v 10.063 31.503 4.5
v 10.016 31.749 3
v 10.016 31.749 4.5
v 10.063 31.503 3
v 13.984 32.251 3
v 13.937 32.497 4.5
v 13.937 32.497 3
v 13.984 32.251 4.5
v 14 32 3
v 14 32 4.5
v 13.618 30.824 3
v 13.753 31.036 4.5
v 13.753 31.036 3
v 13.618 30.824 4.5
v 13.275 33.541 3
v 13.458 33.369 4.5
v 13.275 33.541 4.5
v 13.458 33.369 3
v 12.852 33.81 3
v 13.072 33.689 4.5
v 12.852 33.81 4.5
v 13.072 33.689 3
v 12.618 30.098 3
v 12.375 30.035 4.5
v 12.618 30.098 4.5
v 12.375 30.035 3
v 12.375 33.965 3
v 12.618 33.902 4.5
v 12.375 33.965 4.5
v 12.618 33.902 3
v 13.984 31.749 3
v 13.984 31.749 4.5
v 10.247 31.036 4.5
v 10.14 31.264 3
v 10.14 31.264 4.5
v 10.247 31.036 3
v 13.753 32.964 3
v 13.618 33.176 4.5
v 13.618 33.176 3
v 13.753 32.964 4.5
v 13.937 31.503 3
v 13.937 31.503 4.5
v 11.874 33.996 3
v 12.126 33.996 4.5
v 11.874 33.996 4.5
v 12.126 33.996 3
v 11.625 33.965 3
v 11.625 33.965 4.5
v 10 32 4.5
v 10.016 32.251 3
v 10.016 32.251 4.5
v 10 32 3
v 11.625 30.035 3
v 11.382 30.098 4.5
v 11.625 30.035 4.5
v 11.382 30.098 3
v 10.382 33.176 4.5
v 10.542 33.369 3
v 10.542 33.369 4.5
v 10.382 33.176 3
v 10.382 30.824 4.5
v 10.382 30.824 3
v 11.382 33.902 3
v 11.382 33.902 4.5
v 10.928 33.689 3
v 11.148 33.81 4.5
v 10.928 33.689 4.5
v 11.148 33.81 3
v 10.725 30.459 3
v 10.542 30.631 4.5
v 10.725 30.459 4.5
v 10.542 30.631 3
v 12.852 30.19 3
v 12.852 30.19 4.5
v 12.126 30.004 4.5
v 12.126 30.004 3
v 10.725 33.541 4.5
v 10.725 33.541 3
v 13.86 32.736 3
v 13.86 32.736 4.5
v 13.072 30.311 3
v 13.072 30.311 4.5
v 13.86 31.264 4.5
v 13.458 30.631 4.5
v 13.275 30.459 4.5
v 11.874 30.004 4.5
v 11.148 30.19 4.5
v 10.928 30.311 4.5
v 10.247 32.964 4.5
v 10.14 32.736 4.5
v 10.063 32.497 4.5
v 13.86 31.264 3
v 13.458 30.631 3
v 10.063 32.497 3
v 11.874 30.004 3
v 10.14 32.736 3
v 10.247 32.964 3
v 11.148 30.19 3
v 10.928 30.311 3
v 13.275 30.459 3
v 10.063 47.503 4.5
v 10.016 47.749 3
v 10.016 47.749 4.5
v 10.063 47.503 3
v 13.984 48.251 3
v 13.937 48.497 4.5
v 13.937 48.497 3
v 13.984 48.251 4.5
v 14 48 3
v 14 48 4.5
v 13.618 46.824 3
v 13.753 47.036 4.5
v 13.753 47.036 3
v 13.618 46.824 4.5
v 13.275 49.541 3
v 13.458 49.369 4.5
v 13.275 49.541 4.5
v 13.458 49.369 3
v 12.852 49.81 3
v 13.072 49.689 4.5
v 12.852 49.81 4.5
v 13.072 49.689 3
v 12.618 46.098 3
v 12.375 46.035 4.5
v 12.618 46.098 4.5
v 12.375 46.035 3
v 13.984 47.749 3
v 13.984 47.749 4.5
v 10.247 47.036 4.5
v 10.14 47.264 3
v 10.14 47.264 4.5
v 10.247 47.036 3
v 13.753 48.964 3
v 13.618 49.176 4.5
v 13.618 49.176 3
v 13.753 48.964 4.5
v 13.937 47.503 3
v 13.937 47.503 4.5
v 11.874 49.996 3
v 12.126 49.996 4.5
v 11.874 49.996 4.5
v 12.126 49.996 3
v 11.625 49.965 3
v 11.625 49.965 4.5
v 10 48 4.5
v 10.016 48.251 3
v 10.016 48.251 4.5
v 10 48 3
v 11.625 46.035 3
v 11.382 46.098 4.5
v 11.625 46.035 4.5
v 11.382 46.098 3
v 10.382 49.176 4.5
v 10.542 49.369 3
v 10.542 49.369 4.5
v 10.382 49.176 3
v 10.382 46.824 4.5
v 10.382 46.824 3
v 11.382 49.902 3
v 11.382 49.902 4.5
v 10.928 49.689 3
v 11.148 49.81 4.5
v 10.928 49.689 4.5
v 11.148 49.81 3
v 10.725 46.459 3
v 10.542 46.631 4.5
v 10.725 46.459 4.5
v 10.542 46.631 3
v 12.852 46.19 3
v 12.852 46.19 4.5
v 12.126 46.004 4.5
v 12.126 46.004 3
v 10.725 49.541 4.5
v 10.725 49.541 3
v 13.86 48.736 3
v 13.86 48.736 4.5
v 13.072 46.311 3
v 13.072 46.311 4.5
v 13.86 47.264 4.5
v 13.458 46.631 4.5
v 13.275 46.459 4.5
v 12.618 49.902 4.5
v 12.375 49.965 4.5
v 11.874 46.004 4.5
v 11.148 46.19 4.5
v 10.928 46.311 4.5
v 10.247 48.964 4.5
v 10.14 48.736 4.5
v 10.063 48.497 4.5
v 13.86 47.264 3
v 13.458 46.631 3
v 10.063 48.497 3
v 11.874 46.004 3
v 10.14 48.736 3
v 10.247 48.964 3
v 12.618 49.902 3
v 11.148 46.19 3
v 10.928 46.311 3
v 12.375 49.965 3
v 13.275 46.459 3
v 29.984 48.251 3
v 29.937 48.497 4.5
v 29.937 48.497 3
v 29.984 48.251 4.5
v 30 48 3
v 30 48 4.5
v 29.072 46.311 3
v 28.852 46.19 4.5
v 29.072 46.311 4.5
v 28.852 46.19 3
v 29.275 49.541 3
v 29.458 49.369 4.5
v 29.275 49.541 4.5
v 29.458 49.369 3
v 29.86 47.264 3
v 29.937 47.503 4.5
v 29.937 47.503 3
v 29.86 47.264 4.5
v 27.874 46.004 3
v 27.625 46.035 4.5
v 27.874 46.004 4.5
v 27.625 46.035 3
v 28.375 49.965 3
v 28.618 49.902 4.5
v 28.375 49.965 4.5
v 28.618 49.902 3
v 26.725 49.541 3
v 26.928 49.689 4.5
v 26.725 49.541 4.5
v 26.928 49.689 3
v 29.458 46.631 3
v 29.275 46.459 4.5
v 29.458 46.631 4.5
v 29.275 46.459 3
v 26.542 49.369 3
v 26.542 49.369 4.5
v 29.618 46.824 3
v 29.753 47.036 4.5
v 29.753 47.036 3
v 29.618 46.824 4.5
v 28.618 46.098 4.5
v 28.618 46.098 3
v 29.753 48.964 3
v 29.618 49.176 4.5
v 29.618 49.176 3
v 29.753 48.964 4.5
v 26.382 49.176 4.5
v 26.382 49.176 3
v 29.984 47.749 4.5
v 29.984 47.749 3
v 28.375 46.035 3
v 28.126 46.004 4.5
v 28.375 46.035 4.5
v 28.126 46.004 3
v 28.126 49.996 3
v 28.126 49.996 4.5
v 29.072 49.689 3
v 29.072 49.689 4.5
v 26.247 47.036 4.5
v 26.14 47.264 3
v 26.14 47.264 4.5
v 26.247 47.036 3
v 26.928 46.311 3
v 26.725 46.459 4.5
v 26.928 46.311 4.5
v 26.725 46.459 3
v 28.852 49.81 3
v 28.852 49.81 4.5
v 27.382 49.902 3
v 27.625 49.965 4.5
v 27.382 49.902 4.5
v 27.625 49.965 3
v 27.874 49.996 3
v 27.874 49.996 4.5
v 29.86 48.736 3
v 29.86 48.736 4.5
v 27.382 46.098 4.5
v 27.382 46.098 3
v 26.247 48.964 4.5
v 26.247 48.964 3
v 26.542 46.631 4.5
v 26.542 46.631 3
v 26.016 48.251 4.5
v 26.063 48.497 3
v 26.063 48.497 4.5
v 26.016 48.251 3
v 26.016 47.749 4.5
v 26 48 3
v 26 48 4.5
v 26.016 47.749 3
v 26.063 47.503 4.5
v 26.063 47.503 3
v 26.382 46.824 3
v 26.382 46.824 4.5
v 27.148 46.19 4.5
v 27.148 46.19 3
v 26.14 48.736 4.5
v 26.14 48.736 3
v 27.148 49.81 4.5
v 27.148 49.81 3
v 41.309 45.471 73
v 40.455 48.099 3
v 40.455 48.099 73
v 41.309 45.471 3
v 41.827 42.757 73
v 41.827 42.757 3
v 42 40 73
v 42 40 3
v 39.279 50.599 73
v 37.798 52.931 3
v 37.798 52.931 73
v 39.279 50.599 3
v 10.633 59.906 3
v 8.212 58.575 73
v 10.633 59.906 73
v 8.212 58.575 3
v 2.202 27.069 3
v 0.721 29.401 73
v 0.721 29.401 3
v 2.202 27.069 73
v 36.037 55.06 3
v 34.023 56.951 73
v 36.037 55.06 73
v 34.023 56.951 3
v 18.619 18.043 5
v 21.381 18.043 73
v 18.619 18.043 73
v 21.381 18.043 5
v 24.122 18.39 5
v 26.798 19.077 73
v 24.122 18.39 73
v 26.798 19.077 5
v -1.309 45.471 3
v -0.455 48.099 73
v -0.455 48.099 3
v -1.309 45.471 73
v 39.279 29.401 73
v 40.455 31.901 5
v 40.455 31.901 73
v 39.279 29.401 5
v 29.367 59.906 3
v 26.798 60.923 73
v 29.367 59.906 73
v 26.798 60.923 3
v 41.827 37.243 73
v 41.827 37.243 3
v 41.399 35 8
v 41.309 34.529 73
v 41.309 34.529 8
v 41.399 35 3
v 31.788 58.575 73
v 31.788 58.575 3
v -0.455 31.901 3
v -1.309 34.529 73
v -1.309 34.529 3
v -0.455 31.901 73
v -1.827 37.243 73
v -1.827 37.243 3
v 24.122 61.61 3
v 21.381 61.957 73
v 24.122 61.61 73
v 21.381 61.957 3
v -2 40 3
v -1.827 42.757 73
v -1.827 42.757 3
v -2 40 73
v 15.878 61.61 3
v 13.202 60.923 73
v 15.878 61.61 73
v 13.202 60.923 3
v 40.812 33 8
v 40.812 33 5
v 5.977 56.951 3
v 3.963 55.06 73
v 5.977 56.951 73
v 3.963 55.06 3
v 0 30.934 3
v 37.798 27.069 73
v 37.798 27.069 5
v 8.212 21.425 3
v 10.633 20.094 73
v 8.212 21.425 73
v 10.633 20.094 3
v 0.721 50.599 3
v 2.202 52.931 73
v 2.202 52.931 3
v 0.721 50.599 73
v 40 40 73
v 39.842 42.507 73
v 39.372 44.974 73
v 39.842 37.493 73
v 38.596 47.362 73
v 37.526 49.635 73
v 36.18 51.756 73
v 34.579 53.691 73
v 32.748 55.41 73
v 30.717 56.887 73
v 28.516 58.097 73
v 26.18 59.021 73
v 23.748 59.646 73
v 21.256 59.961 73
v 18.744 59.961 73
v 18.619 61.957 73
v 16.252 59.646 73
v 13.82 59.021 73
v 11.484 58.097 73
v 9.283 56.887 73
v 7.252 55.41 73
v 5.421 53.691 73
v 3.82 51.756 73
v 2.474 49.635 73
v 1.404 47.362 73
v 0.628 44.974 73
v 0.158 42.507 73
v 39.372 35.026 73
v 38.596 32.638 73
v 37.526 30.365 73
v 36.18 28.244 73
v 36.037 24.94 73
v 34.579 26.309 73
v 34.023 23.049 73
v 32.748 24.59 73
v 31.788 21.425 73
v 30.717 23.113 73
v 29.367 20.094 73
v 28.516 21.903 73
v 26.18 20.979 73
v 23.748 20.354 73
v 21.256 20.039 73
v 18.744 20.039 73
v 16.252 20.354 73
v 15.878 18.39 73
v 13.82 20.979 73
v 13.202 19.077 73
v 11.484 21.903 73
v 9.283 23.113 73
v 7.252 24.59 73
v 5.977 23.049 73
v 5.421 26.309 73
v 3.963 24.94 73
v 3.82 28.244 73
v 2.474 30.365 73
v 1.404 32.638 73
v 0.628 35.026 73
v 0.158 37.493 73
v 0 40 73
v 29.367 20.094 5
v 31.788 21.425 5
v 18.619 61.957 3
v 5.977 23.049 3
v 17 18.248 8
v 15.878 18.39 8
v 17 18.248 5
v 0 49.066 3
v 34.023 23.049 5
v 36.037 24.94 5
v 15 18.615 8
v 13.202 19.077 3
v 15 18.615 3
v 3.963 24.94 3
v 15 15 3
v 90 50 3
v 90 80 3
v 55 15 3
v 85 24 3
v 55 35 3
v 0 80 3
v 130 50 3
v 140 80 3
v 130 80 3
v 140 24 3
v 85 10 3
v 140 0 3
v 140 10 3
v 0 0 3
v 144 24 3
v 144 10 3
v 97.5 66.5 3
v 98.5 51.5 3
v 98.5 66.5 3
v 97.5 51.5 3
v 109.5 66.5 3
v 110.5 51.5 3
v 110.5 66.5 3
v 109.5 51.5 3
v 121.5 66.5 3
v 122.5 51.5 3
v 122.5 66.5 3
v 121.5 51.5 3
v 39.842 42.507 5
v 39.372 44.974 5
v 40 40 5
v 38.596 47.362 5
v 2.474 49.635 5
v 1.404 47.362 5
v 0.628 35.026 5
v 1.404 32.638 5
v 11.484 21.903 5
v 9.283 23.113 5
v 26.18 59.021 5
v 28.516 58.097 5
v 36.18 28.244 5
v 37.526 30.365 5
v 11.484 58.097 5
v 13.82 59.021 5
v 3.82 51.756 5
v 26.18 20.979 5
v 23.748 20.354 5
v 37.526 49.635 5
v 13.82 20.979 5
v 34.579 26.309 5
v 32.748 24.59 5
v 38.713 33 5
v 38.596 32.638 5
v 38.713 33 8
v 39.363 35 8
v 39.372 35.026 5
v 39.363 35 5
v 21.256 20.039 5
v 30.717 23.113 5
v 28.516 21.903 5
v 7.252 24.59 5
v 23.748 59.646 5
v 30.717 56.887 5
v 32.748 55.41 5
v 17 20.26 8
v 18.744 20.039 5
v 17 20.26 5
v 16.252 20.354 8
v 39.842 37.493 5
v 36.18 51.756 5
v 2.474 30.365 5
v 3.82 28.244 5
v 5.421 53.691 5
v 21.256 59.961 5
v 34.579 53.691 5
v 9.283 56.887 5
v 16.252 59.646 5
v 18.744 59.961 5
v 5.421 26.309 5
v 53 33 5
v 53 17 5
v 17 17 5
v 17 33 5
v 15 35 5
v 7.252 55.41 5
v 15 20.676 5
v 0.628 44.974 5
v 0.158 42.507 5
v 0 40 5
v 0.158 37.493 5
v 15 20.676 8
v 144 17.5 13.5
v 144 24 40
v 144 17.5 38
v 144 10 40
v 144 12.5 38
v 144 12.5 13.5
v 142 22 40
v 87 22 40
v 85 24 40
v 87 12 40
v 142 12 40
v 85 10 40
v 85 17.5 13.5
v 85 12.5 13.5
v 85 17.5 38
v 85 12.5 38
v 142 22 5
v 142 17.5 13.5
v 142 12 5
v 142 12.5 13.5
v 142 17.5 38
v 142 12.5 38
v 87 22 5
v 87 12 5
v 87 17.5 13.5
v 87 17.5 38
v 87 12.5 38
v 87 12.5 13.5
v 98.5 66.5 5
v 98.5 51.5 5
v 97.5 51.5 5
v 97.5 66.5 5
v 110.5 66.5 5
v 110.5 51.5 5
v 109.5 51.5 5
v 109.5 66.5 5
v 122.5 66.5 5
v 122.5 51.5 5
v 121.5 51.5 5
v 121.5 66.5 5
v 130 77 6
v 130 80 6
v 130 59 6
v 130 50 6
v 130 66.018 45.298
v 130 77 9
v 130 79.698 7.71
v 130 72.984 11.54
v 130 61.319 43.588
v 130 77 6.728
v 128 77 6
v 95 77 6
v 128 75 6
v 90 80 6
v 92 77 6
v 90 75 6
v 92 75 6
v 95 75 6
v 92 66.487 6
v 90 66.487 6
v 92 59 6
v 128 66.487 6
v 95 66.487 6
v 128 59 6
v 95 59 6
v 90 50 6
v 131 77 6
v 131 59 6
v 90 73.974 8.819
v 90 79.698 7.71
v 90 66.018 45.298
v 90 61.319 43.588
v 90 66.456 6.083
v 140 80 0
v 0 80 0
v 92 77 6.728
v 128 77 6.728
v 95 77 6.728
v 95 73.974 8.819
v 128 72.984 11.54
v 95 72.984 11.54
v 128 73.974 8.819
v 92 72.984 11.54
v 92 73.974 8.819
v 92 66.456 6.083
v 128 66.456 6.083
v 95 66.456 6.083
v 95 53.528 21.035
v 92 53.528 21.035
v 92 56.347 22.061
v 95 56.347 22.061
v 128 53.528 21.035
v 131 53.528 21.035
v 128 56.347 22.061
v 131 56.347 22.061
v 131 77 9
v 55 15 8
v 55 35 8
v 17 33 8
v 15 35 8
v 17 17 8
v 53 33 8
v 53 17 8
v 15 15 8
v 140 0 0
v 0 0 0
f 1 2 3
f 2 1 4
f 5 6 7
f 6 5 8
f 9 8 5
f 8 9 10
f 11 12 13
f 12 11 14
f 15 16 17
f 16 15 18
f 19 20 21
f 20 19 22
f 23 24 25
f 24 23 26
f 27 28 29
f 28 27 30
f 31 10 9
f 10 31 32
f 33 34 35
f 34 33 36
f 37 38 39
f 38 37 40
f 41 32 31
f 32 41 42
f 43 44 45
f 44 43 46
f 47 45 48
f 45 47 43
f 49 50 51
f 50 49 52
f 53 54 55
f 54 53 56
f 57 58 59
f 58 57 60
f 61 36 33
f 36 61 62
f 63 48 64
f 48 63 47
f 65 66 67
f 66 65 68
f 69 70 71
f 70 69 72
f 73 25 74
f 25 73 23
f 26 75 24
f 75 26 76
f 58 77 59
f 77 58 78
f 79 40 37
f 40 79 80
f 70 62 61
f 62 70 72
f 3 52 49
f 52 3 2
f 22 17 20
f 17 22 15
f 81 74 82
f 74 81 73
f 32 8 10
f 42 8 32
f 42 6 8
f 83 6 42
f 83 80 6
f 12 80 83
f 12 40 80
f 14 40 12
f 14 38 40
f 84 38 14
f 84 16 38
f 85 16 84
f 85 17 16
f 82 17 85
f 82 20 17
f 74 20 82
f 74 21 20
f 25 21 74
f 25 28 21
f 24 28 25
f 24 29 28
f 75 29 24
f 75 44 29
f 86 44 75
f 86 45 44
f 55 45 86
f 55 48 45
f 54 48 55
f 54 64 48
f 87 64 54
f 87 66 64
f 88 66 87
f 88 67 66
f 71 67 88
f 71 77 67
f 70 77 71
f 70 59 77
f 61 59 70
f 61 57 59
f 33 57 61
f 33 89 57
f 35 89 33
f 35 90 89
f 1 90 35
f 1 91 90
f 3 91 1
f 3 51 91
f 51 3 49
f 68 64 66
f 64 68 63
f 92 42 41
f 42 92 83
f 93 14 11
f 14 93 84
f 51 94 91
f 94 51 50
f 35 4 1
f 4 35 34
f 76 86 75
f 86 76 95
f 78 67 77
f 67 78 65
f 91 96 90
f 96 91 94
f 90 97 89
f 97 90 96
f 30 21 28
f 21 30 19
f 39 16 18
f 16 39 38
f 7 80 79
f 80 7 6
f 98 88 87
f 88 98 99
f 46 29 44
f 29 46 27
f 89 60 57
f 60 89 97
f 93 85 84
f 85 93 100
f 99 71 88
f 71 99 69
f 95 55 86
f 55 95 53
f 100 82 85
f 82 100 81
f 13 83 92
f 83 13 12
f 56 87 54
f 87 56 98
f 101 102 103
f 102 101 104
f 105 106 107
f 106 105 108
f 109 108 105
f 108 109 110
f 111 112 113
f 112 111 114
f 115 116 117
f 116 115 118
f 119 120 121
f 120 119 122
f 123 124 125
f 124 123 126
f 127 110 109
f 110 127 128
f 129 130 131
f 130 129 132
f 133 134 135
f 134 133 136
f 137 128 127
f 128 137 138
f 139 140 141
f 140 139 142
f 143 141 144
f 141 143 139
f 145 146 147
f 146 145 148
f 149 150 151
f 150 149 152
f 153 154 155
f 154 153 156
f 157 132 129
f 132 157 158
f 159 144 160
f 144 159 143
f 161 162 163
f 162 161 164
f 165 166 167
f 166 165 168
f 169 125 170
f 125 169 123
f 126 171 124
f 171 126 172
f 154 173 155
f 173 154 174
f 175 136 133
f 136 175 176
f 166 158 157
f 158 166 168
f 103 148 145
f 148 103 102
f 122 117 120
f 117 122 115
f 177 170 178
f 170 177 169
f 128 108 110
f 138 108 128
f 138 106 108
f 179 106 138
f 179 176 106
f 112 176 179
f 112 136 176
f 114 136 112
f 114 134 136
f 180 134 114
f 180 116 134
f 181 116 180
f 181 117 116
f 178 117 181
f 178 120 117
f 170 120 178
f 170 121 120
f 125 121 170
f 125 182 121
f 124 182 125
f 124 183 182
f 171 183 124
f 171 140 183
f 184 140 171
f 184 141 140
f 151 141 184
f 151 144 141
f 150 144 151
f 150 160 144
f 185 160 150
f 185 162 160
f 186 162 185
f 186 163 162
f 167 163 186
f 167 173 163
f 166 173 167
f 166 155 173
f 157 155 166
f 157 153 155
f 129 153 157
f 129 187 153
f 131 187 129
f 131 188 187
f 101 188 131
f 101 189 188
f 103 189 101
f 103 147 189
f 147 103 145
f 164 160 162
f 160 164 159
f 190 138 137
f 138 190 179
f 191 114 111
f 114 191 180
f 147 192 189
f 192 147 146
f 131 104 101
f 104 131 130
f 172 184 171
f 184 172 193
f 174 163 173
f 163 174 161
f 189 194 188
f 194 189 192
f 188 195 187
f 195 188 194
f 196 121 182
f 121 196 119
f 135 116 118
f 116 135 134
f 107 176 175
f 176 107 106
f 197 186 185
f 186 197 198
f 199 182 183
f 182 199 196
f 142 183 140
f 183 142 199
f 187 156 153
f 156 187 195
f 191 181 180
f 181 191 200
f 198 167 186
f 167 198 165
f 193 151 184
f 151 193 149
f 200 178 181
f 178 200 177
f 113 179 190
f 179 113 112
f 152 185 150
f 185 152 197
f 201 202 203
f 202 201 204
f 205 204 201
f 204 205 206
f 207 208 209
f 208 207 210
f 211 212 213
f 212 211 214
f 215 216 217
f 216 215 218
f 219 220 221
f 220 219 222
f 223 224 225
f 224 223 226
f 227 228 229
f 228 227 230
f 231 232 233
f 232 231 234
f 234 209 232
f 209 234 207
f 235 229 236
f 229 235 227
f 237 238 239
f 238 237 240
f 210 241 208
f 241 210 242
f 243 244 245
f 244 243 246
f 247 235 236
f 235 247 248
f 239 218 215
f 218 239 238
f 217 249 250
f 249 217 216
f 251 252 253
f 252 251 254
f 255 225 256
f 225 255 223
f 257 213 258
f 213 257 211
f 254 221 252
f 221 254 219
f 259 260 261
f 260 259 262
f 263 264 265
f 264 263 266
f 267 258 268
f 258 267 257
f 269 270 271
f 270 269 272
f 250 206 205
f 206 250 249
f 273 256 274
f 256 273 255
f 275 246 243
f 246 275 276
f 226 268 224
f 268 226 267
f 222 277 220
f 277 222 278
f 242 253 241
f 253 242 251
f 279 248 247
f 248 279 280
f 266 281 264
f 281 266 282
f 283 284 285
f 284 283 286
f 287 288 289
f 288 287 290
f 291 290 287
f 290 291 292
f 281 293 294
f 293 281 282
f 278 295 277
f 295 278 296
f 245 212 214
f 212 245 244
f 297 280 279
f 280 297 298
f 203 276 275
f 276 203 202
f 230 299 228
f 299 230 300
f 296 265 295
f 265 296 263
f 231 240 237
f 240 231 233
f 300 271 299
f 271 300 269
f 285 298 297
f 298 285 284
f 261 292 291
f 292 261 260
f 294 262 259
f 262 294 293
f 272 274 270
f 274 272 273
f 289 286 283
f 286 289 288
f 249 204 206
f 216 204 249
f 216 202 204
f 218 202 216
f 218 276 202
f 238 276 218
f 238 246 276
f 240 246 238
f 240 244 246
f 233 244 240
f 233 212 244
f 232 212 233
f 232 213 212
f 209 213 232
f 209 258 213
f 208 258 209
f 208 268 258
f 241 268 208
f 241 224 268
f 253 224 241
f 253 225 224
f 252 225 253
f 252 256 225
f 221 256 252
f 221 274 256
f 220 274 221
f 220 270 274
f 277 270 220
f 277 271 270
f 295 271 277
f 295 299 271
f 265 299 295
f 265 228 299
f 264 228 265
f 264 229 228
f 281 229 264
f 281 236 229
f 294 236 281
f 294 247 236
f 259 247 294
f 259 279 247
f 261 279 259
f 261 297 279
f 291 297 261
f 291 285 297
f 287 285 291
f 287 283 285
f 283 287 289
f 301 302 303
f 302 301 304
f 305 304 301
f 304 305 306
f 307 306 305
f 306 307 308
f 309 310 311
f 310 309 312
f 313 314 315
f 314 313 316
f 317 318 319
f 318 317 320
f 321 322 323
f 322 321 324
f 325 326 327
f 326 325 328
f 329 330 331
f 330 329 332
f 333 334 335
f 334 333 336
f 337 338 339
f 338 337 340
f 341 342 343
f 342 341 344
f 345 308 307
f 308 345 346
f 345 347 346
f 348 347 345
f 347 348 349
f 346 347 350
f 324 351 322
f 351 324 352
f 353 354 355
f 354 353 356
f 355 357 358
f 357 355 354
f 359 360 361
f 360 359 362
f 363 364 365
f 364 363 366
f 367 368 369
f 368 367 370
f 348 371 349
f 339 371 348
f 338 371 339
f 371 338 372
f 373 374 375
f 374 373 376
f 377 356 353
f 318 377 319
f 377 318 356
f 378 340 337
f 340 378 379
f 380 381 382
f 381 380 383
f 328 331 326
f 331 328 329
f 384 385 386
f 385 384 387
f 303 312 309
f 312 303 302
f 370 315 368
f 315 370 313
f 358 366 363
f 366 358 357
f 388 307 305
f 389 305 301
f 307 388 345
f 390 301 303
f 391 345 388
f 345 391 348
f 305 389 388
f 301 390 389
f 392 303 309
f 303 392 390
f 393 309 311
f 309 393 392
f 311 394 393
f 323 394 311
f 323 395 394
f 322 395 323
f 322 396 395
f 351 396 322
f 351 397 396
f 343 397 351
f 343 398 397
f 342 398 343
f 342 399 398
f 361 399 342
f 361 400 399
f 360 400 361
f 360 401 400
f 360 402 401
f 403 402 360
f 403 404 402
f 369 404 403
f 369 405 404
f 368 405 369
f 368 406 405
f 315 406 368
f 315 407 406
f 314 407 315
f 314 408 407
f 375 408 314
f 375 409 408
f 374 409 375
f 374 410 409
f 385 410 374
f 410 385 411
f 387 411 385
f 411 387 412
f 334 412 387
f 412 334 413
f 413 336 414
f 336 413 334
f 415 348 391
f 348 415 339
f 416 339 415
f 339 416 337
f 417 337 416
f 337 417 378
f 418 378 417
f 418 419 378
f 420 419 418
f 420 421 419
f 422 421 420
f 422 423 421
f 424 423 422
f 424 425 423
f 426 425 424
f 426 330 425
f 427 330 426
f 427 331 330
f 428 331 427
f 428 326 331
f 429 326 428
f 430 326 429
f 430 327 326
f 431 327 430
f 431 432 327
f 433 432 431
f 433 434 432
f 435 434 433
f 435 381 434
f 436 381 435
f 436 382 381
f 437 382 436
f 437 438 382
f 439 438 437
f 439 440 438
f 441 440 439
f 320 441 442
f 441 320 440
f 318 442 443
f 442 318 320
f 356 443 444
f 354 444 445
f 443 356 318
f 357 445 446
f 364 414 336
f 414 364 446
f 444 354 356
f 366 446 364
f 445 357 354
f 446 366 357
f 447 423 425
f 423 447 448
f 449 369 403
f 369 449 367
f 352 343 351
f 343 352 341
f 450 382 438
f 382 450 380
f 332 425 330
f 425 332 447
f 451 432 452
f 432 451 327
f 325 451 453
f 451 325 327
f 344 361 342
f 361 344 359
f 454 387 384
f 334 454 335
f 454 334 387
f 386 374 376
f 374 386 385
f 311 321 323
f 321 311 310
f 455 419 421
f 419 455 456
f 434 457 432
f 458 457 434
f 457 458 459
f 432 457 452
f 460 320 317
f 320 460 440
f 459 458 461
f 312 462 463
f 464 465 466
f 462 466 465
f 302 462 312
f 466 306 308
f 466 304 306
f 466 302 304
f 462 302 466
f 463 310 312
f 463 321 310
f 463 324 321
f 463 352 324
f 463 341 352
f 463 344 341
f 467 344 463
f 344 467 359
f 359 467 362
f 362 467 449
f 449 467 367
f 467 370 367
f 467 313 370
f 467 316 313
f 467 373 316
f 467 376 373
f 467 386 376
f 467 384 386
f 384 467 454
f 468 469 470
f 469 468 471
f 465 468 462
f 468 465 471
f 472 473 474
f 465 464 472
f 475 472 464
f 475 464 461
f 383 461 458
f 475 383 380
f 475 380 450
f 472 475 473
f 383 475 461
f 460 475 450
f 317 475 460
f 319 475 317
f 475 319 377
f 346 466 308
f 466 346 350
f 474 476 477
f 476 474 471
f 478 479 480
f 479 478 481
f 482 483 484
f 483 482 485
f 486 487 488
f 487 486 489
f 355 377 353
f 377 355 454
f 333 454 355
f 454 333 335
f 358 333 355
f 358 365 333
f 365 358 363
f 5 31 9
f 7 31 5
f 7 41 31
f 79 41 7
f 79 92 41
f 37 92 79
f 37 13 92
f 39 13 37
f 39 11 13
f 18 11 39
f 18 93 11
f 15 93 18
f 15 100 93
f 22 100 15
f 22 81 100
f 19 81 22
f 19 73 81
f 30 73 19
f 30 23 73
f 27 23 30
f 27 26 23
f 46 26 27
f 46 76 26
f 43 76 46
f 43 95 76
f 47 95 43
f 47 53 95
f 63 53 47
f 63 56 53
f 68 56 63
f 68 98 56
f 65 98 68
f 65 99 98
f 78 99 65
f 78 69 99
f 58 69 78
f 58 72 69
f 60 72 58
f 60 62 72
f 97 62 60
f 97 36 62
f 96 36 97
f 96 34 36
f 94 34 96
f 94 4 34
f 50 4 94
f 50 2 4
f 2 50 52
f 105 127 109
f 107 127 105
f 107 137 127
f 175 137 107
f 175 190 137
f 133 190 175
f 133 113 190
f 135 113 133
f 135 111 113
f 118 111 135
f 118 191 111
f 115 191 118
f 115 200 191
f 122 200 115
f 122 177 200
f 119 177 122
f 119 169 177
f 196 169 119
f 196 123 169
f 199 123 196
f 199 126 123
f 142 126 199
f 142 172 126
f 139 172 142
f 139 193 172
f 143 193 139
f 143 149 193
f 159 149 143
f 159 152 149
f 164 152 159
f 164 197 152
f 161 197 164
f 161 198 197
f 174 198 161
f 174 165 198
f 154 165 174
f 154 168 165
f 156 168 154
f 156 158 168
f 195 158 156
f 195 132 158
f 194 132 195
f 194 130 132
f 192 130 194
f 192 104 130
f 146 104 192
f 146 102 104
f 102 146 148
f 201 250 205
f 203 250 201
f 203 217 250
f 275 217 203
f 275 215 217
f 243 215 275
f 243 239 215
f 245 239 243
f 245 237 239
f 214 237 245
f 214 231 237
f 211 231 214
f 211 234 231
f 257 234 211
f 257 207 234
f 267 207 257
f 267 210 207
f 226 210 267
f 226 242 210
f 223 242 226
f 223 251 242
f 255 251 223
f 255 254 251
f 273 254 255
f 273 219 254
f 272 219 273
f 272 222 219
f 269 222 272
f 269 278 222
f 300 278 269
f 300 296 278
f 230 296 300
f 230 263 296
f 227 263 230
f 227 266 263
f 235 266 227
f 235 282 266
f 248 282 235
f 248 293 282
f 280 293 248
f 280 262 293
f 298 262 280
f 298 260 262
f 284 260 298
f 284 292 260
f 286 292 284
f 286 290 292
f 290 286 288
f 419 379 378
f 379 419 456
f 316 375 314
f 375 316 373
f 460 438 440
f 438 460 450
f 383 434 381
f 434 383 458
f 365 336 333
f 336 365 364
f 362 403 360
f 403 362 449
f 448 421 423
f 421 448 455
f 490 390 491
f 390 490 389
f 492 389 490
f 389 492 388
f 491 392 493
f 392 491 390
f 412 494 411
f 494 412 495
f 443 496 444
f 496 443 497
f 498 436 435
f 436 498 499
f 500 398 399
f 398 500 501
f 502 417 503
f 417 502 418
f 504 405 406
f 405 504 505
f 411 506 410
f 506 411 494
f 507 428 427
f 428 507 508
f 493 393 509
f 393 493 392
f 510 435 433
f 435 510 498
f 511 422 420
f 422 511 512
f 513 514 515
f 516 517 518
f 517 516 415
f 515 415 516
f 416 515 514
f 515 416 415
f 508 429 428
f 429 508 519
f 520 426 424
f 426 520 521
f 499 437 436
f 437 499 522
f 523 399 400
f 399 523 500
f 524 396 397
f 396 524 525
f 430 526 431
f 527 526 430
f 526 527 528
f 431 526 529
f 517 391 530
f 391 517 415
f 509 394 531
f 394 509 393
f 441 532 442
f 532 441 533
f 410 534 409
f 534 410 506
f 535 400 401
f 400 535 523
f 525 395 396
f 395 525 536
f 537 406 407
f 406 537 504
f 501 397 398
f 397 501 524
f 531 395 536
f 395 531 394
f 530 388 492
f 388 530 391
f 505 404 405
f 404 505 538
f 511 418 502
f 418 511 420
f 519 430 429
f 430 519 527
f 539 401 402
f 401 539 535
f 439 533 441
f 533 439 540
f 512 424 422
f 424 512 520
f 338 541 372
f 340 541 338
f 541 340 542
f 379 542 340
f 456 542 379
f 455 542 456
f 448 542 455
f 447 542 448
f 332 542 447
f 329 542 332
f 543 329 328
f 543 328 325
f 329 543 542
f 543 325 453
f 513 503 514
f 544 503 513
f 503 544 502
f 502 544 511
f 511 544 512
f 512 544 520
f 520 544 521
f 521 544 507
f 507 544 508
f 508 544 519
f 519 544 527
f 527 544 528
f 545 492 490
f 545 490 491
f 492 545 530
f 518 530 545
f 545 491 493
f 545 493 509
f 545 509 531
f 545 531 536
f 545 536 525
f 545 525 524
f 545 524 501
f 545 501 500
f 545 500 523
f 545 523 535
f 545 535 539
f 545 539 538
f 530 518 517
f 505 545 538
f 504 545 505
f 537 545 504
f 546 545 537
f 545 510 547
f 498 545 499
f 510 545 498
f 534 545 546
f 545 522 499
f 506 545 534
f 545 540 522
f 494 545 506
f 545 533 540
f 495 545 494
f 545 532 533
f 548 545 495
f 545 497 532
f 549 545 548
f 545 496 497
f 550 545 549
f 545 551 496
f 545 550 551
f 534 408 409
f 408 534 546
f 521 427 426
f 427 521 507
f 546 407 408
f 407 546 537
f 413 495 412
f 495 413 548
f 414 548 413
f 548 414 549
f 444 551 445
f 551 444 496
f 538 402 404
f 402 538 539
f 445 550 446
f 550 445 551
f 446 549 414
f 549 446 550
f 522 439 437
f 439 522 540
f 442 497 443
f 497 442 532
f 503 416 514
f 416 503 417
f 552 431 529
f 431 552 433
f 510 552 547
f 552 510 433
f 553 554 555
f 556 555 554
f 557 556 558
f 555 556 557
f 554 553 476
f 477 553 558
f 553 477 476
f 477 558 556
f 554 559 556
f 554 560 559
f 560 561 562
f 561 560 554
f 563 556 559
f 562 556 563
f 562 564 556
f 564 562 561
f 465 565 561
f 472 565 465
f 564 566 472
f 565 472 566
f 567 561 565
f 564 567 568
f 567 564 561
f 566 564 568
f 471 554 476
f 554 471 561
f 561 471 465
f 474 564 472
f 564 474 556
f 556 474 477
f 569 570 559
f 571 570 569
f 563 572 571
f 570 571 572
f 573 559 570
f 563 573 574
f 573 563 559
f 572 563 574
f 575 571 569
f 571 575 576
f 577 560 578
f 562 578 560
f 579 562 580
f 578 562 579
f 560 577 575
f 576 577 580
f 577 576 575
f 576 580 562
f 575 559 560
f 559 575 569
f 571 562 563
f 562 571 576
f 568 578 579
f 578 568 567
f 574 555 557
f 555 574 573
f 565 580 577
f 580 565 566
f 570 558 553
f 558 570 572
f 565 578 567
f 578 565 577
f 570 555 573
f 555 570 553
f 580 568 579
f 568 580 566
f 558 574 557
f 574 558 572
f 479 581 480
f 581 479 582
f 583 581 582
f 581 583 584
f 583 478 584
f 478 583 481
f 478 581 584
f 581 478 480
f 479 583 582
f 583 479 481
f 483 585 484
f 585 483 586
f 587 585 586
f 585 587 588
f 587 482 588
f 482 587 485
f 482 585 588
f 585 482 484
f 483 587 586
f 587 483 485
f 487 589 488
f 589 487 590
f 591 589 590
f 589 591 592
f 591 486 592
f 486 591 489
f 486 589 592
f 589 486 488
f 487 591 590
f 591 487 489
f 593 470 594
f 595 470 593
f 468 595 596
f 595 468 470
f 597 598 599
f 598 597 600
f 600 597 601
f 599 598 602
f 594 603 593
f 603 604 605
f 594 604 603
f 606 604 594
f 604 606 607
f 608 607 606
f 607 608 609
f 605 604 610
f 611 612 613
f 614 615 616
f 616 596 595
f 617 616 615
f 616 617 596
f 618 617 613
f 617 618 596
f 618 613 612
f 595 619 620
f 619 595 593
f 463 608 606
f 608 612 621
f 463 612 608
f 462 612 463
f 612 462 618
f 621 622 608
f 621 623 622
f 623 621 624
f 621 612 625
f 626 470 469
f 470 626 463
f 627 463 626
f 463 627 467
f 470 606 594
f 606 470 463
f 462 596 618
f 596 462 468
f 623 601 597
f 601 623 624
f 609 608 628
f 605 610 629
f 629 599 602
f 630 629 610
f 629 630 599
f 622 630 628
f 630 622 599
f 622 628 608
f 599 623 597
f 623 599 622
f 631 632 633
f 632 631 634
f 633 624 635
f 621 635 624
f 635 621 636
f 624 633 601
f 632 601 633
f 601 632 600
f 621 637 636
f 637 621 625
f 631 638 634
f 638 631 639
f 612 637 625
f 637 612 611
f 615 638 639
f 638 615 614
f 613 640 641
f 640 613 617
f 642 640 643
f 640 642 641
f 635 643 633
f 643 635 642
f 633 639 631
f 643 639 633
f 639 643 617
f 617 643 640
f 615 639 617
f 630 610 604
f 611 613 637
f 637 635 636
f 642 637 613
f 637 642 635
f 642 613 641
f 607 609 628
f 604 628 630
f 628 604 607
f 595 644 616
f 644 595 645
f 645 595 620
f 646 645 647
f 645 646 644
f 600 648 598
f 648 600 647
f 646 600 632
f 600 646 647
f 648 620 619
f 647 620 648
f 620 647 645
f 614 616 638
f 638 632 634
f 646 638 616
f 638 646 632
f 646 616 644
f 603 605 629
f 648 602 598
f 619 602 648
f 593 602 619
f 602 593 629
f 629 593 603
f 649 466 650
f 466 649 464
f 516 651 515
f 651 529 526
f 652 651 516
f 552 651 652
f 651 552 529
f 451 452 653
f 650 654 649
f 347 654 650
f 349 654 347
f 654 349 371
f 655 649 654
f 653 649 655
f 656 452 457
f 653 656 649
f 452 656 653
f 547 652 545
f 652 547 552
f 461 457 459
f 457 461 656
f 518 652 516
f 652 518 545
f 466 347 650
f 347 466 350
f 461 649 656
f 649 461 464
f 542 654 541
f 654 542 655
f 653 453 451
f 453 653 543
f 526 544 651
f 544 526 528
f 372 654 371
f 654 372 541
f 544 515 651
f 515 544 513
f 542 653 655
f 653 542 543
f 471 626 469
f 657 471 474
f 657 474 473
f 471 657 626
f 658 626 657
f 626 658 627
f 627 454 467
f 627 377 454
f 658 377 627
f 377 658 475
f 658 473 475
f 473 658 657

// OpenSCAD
// examples/desktop_organizer.scad
// ==============================================
// 桌面收纳 — 笔筒 + 名片夹 + 手机支架一体
// 适合 3D 打印的实用桌面配件

$fn = 50;

// ---- 笔筒部分 ----
module pen_holder(
    diameter = 50,
    height   = 80,
    wall     = 2,
    bottom   = 2
) {
    difference() {
        cylinder(r = diameter / 2 + wall, h = height);

        // 内部
        translate([0, 0, bottom])
            cylinder(r = diameter / 2, h = height);

        // 底部排水/透气孔
        for (x = [-1, 1]) {
            for (y = [-1, 1]) {
                translate([x * diameter * 0.2,
                           y * diameter * 0.2, 0])
                    cylinder(r = 2, h = bottom + 1, center = true);
            }
        }
    }
}

// ---- 名片夹 ----
module business_card_holder(
    width  = 55,
    depth  = 10,
    height = 35,
    wall   = 2,
    angle  = 15  // 倾斜角度
) {
    rotate([0, angle, 0]) {
        difference() {
            // 外壳
            cube([width + 2 * wall, depth + 2 * wall, height + wall]);

            // 卡片槽
            translate([wall, wall, wall])
                cube([width, depth, height]);

            // 前侧开口(方便取卡)
            translate([-1, depth / 4, height * 0.3])
                cube([width + 2 * wall + 2, depth / 2, height * 0.7]);
        }
    }
}

// ---- 手机支架 ----
module phone_stand(
    base_w    = 60,
    base_d    = 50,
    height    = 50,
    angle     = 20,
    phone_thk = 12
) {
    union() {
        // 底座
        difference() {
            translate([0, 0, 0])
                cube([base_w, base_d, 3]);

            // 防滑槽
            for (x = [-base_w * 0.3, 0, base_w * 0.3]) {
                translate([x + base_w / 2, base_d * 0.3, 0])
                    cube([1, base_d * 0.5, 4], center = true);
            }
        }

        // 支撑板
        translate([0, base_d - 5, 3])
            rotate([angle, 0, 0]) {
                cube([base_w, 5, height]);

                // 手机搁板
                translate([0, 0, height - 5])
                    cube([base_w, 2, 5]);

                // 底部档条
                translate([0, -8, 0])
                    cube([base_w, 10, 3]);
            }

        // 侧面加强筋
        for (x = [2, base_w - 2]) {
            hull() {
                translate([x, base_d - 8, 3])
                    cube([3, 5, 3]);
                translate([x, base_d * 0.3, 3])
                    rotate([angle, 0, 0])
                        cube([3, 3, height * 0.4]);
            }
        }
    }
}

// ---- 组装 ----
// 底板
color("darkgray")
    translate([0, 0, 0])
        cube([140, 80, 3]);

// 笔筒
color("steelblue")
    translate([20, 40, 3])
        pen_holder(diameter = 40, height = 70);

// 名片夹
color("darkgreen")
    translate([85, 10, 3])
        rotate([0, -15, 0])
            business_card_holder();

// 手机支架
color("darkorange")
    translate([90, 50, 3])
        phone_stand(base_w = 40, base_d = 30, height = 40);

// 小件托盘
color("silver")
    translate([15, 15, 3])
        difference() {
            cube([40, 20, 5]);
            translate([2, 2, 2])
                cube([36, 16, 4]);
        }
